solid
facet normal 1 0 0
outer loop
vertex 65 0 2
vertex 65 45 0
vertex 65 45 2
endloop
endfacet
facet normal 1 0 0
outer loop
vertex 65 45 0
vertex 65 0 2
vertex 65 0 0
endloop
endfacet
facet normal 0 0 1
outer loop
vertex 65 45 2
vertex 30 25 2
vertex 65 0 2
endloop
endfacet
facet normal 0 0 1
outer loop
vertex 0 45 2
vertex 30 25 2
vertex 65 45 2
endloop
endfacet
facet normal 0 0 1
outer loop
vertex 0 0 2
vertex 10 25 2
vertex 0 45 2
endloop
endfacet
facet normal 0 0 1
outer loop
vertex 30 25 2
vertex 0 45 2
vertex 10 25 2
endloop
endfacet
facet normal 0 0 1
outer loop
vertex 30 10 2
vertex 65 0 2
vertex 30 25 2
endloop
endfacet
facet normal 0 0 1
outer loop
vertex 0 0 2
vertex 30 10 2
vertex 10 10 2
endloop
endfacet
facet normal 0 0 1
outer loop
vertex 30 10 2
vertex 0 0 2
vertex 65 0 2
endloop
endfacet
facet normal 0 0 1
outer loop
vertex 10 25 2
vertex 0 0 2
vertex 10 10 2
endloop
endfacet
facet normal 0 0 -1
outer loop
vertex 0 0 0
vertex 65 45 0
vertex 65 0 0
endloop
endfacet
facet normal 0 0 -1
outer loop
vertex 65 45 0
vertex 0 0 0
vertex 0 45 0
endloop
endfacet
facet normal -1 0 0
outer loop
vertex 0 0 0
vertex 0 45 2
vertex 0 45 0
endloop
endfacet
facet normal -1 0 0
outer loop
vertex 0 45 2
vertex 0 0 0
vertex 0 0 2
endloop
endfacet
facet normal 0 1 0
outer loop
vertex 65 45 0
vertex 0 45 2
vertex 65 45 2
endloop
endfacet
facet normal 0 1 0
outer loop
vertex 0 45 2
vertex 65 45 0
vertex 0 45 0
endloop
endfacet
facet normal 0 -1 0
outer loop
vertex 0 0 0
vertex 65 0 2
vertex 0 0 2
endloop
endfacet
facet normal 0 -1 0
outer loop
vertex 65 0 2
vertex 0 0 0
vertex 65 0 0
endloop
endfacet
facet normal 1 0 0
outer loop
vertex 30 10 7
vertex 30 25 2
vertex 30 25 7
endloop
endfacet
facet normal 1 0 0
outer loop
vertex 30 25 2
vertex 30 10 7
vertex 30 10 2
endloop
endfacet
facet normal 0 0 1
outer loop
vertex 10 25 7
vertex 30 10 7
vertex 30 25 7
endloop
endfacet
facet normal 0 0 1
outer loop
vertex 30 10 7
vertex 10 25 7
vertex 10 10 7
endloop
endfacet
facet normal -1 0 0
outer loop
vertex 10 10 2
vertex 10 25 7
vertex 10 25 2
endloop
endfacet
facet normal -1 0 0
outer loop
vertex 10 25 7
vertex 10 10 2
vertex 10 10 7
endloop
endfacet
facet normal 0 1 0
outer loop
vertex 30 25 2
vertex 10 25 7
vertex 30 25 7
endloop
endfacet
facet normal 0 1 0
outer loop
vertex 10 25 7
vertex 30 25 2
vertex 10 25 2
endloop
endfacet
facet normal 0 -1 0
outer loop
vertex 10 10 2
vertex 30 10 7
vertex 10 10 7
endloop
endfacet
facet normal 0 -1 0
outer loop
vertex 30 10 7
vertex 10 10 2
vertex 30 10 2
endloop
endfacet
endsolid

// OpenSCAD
// Concept only. Provisional dimensions in mm.
$fn=32;
cube([65,45,2]);translate([10,10,2])cube([20,15,5]);
